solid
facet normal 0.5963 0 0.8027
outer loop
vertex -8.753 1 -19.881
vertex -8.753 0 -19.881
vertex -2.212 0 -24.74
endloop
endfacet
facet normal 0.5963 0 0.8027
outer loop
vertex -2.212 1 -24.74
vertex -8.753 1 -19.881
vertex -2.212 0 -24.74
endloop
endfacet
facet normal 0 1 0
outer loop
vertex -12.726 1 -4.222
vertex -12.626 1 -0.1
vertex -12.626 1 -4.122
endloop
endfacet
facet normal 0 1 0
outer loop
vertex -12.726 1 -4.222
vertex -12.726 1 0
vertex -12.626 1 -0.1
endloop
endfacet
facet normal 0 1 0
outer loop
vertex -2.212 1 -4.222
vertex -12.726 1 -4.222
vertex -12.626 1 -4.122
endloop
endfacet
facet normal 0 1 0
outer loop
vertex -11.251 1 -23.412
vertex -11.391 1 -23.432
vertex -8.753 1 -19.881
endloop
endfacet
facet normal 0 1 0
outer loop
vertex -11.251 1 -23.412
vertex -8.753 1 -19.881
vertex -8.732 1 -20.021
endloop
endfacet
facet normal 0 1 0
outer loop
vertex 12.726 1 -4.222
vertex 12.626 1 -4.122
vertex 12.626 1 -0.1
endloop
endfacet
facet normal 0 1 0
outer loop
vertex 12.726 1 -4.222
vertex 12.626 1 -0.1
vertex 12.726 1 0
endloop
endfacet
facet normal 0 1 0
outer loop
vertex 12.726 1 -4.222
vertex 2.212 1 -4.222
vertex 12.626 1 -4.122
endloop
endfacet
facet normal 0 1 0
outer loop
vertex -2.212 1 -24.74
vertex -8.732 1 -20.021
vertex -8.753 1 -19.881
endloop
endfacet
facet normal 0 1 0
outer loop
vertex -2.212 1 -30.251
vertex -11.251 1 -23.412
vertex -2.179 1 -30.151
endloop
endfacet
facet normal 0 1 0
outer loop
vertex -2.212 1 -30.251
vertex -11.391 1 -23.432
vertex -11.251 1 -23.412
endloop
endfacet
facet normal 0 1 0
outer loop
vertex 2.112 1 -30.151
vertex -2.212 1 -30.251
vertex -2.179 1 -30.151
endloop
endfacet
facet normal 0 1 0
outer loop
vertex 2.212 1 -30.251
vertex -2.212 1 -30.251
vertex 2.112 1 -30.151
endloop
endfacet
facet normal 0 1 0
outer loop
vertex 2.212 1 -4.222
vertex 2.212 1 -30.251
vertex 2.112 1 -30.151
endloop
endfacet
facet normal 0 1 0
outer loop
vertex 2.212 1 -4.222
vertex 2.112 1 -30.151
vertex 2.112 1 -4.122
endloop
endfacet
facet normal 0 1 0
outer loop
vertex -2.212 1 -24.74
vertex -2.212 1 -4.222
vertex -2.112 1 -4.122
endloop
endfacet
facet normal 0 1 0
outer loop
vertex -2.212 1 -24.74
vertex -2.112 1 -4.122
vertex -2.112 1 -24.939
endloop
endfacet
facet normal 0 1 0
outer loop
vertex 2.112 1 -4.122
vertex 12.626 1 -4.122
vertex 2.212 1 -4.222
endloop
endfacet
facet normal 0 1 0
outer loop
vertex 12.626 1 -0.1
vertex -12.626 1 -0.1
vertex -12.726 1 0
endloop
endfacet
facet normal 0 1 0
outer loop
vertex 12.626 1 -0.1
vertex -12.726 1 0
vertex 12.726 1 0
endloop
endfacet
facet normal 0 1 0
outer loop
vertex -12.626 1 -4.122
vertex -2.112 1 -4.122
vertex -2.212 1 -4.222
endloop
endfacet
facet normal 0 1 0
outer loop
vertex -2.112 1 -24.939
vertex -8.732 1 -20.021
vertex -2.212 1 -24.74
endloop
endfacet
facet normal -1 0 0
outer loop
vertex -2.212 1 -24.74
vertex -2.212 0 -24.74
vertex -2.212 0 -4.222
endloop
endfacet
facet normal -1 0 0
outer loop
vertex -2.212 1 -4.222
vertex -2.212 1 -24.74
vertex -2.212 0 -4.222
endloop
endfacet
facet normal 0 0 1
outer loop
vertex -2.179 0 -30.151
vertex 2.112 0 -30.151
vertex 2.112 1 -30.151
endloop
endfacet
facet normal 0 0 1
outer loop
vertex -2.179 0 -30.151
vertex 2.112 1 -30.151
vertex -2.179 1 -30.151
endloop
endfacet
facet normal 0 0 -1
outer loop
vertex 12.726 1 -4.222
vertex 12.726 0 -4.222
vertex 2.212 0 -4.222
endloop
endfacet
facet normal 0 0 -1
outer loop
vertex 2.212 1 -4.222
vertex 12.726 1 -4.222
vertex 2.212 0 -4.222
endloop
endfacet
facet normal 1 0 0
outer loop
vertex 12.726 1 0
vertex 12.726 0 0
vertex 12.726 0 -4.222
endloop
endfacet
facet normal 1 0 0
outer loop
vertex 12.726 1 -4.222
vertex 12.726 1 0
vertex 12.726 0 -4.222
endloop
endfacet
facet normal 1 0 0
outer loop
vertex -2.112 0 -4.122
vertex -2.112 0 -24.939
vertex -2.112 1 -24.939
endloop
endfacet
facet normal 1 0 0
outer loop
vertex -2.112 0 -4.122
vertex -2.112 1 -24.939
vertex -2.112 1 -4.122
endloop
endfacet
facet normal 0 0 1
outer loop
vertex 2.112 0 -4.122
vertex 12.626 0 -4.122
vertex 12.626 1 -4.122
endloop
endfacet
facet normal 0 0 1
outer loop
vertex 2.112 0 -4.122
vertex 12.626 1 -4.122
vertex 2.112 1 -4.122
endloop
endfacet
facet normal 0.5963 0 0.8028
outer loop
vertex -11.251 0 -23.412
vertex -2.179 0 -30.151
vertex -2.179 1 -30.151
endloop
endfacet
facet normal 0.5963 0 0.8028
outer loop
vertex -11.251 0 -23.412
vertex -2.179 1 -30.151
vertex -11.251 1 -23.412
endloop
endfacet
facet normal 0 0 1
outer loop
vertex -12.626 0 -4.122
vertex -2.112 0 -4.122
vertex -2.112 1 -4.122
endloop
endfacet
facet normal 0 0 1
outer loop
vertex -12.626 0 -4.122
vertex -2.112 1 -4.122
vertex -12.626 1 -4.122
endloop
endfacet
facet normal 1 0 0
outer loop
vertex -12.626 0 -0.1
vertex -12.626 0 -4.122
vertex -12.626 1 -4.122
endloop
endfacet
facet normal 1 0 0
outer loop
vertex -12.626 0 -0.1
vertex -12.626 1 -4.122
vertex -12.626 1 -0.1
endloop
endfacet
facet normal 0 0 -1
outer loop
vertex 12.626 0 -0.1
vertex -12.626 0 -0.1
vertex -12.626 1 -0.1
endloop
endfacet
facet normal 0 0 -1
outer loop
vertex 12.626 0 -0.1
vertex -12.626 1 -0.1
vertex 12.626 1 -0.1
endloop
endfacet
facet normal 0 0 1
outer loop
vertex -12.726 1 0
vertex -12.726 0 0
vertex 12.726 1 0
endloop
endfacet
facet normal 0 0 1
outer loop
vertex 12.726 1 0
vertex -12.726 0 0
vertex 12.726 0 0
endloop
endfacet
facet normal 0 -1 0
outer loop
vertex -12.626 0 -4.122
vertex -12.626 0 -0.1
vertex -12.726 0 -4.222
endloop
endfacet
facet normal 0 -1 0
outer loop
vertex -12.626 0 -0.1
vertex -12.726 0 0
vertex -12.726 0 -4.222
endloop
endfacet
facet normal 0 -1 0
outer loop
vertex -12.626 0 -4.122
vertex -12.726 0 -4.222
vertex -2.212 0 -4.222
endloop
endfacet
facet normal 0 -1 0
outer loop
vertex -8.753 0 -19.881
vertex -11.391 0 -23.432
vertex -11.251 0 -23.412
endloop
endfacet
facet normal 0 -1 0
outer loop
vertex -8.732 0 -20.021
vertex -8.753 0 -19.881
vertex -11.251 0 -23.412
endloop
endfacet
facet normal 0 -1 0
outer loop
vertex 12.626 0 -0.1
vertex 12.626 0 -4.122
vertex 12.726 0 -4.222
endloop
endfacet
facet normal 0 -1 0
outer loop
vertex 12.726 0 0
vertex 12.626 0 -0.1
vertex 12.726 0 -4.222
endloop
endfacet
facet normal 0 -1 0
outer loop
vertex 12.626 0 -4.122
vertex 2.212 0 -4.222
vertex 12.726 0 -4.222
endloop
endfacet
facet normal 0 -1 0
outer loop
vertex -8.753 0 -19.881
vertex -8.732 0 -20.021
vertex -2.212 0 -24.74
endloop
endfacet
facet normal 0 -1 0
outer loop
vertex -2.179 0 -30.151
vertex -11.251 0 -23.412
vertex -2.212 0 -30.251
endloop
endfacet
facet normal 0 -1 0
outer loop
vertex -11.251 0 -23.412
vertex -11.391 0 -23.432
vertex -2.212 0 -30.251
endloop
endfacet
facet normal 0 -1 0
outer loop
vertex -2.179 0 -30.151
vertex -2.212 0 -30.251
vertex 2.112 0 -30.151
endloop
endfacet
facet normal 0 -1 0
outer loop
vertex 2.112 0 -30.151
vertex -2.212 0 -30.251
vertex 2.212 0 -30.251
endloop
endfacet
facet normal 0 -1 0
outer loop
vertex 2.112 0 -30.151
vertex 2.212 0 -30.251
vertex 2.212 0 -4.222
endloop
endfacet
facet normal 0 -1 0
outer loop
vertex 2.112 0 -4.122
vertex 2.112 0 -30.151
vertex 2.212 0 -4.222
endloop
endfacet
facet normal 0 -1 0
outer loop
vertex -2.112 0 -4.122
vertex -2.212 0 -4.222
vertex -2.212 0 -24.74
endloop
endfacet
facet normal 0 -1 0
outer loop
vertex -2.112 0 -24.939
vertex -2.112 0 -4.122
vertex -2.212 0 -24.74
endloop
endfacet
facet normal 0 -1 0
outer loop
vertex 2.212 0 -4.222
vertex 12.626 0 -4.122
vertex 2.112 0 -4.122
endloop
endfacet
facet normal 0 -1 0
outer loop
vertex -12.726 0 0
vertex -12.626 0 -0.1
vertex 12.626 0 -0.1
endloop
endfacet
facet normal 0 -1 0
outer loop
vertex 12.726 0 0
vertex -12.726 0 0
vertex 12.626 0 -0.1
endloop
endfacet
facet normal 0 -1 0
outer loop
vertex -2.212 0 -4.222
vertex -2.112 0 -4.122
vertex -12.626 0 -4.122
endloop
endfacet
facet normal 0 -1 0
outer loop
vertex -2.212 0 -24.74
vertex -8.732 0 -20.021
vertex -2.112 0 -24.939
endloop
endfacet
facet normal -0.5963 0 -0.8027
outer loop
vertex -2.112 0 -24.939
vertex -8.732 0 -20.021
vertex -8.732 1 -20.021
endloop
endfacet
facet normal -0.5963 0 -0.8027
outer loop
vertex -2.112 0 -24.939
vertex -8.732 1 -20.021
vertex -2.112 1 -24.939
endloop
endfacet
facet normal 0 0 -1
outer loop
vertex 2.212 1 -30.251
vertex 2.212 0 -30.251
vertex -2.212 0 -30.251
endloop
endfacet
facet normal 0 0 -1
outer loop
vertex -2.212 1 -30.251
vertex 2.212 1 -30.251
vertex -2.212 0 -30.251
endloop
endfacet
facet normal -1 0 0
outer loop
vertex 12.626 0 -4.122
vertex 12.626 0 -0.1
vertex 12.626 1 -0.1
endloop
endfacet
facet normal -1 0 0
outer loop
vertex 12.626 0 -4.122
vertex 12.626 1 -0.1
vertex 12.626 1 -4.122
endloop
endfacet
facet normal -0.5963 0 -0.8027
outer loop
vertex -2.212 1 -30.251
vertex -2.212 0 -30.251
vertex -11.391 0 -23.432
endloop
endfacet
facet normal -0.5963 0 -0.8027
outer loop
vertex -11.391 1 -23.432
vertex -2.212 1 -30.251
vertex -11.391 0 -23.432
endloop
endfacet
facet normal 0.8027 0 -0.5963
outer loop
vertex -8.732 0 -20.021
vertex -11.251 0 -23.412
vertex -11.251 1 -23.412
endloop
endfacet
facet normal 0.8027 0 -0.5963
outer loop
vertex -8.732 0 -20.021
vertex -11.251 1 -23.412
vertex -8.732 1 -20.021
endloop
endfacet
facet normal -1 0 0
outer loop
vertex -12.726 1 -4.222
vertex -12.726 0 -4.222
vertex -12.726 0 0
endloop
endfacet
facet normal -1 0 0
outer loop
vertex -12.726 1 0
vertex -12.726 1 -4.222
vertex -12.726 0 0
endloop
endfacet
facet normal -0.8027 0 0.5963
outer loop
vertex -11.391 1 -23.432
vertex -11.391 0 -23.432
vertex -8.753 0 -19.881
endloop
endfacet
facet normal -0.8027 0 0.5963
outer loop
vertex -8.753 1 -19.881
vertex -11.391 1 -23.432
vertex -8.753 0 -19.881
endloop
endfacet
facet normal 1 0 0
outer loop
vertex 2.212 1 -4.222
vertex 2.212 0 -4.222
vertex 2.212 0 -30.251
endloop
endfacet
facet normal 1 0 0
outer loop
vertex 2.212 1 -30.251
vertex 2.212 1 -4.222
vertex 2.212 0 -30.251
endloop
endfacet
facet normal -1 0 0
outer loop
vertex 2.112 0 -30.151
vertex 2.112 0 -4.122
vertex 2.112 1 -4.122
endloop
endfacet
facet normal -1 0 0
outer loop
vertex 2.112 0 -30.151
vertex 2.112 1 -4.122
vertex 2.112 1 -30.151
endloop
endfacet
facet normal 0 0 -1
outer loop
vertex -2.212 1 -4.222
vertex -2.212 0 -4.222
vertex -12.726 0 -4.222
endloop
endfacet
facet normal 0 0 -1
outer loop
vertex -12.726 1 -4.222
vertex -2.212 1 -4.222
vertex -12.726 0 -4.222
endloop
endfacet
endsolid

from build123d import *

# Parameters (mm, degrees)
BOSS_EXTRUDE1_DEPTH = 1


with BuildPart() as part:
    # Sketch1 → Boss-Extrude1 (new body)
    with BuildSketch(Plane(origin=(0, 0, 0), x_dir=(1, 0, 0), z_dir=(0, 1, 0))):
        Polygon((-12.726436998, 0), (12.726436998, 0), (12.726436998, 4.221634294), (2.211948406, 4.221634294), (2.211948406, 30.250890115), (-2.211948406, 30.250890115), (-11.390670326, 23.432410974), (-8.752594478, 19.881155024), (-2.211948406, 24.739920677), (-2.211948406, 4.221634294), (-12.726436998, 4.221634294), align=None)
        Polygon((-2.178869719, 30.150890115), (-11.250763541, 23.411768989), (-8.731952493, 20.021061809), (-2.111948406, 24.938779131), (-2.111948406, 4.121634294), (-12.626436998, 4.121634294), (-12.626436998, 0.1), (12.626436998, 0.1), (12.626436998, 4.121634294), (2.111948406, 4.121634294), (2.111948406, 30.150890115), align=None, mode=Mode.SUBTRACT)
    extrude(amount=BOSS_EXTRUDE1_DEPTH)


solid = part.part
